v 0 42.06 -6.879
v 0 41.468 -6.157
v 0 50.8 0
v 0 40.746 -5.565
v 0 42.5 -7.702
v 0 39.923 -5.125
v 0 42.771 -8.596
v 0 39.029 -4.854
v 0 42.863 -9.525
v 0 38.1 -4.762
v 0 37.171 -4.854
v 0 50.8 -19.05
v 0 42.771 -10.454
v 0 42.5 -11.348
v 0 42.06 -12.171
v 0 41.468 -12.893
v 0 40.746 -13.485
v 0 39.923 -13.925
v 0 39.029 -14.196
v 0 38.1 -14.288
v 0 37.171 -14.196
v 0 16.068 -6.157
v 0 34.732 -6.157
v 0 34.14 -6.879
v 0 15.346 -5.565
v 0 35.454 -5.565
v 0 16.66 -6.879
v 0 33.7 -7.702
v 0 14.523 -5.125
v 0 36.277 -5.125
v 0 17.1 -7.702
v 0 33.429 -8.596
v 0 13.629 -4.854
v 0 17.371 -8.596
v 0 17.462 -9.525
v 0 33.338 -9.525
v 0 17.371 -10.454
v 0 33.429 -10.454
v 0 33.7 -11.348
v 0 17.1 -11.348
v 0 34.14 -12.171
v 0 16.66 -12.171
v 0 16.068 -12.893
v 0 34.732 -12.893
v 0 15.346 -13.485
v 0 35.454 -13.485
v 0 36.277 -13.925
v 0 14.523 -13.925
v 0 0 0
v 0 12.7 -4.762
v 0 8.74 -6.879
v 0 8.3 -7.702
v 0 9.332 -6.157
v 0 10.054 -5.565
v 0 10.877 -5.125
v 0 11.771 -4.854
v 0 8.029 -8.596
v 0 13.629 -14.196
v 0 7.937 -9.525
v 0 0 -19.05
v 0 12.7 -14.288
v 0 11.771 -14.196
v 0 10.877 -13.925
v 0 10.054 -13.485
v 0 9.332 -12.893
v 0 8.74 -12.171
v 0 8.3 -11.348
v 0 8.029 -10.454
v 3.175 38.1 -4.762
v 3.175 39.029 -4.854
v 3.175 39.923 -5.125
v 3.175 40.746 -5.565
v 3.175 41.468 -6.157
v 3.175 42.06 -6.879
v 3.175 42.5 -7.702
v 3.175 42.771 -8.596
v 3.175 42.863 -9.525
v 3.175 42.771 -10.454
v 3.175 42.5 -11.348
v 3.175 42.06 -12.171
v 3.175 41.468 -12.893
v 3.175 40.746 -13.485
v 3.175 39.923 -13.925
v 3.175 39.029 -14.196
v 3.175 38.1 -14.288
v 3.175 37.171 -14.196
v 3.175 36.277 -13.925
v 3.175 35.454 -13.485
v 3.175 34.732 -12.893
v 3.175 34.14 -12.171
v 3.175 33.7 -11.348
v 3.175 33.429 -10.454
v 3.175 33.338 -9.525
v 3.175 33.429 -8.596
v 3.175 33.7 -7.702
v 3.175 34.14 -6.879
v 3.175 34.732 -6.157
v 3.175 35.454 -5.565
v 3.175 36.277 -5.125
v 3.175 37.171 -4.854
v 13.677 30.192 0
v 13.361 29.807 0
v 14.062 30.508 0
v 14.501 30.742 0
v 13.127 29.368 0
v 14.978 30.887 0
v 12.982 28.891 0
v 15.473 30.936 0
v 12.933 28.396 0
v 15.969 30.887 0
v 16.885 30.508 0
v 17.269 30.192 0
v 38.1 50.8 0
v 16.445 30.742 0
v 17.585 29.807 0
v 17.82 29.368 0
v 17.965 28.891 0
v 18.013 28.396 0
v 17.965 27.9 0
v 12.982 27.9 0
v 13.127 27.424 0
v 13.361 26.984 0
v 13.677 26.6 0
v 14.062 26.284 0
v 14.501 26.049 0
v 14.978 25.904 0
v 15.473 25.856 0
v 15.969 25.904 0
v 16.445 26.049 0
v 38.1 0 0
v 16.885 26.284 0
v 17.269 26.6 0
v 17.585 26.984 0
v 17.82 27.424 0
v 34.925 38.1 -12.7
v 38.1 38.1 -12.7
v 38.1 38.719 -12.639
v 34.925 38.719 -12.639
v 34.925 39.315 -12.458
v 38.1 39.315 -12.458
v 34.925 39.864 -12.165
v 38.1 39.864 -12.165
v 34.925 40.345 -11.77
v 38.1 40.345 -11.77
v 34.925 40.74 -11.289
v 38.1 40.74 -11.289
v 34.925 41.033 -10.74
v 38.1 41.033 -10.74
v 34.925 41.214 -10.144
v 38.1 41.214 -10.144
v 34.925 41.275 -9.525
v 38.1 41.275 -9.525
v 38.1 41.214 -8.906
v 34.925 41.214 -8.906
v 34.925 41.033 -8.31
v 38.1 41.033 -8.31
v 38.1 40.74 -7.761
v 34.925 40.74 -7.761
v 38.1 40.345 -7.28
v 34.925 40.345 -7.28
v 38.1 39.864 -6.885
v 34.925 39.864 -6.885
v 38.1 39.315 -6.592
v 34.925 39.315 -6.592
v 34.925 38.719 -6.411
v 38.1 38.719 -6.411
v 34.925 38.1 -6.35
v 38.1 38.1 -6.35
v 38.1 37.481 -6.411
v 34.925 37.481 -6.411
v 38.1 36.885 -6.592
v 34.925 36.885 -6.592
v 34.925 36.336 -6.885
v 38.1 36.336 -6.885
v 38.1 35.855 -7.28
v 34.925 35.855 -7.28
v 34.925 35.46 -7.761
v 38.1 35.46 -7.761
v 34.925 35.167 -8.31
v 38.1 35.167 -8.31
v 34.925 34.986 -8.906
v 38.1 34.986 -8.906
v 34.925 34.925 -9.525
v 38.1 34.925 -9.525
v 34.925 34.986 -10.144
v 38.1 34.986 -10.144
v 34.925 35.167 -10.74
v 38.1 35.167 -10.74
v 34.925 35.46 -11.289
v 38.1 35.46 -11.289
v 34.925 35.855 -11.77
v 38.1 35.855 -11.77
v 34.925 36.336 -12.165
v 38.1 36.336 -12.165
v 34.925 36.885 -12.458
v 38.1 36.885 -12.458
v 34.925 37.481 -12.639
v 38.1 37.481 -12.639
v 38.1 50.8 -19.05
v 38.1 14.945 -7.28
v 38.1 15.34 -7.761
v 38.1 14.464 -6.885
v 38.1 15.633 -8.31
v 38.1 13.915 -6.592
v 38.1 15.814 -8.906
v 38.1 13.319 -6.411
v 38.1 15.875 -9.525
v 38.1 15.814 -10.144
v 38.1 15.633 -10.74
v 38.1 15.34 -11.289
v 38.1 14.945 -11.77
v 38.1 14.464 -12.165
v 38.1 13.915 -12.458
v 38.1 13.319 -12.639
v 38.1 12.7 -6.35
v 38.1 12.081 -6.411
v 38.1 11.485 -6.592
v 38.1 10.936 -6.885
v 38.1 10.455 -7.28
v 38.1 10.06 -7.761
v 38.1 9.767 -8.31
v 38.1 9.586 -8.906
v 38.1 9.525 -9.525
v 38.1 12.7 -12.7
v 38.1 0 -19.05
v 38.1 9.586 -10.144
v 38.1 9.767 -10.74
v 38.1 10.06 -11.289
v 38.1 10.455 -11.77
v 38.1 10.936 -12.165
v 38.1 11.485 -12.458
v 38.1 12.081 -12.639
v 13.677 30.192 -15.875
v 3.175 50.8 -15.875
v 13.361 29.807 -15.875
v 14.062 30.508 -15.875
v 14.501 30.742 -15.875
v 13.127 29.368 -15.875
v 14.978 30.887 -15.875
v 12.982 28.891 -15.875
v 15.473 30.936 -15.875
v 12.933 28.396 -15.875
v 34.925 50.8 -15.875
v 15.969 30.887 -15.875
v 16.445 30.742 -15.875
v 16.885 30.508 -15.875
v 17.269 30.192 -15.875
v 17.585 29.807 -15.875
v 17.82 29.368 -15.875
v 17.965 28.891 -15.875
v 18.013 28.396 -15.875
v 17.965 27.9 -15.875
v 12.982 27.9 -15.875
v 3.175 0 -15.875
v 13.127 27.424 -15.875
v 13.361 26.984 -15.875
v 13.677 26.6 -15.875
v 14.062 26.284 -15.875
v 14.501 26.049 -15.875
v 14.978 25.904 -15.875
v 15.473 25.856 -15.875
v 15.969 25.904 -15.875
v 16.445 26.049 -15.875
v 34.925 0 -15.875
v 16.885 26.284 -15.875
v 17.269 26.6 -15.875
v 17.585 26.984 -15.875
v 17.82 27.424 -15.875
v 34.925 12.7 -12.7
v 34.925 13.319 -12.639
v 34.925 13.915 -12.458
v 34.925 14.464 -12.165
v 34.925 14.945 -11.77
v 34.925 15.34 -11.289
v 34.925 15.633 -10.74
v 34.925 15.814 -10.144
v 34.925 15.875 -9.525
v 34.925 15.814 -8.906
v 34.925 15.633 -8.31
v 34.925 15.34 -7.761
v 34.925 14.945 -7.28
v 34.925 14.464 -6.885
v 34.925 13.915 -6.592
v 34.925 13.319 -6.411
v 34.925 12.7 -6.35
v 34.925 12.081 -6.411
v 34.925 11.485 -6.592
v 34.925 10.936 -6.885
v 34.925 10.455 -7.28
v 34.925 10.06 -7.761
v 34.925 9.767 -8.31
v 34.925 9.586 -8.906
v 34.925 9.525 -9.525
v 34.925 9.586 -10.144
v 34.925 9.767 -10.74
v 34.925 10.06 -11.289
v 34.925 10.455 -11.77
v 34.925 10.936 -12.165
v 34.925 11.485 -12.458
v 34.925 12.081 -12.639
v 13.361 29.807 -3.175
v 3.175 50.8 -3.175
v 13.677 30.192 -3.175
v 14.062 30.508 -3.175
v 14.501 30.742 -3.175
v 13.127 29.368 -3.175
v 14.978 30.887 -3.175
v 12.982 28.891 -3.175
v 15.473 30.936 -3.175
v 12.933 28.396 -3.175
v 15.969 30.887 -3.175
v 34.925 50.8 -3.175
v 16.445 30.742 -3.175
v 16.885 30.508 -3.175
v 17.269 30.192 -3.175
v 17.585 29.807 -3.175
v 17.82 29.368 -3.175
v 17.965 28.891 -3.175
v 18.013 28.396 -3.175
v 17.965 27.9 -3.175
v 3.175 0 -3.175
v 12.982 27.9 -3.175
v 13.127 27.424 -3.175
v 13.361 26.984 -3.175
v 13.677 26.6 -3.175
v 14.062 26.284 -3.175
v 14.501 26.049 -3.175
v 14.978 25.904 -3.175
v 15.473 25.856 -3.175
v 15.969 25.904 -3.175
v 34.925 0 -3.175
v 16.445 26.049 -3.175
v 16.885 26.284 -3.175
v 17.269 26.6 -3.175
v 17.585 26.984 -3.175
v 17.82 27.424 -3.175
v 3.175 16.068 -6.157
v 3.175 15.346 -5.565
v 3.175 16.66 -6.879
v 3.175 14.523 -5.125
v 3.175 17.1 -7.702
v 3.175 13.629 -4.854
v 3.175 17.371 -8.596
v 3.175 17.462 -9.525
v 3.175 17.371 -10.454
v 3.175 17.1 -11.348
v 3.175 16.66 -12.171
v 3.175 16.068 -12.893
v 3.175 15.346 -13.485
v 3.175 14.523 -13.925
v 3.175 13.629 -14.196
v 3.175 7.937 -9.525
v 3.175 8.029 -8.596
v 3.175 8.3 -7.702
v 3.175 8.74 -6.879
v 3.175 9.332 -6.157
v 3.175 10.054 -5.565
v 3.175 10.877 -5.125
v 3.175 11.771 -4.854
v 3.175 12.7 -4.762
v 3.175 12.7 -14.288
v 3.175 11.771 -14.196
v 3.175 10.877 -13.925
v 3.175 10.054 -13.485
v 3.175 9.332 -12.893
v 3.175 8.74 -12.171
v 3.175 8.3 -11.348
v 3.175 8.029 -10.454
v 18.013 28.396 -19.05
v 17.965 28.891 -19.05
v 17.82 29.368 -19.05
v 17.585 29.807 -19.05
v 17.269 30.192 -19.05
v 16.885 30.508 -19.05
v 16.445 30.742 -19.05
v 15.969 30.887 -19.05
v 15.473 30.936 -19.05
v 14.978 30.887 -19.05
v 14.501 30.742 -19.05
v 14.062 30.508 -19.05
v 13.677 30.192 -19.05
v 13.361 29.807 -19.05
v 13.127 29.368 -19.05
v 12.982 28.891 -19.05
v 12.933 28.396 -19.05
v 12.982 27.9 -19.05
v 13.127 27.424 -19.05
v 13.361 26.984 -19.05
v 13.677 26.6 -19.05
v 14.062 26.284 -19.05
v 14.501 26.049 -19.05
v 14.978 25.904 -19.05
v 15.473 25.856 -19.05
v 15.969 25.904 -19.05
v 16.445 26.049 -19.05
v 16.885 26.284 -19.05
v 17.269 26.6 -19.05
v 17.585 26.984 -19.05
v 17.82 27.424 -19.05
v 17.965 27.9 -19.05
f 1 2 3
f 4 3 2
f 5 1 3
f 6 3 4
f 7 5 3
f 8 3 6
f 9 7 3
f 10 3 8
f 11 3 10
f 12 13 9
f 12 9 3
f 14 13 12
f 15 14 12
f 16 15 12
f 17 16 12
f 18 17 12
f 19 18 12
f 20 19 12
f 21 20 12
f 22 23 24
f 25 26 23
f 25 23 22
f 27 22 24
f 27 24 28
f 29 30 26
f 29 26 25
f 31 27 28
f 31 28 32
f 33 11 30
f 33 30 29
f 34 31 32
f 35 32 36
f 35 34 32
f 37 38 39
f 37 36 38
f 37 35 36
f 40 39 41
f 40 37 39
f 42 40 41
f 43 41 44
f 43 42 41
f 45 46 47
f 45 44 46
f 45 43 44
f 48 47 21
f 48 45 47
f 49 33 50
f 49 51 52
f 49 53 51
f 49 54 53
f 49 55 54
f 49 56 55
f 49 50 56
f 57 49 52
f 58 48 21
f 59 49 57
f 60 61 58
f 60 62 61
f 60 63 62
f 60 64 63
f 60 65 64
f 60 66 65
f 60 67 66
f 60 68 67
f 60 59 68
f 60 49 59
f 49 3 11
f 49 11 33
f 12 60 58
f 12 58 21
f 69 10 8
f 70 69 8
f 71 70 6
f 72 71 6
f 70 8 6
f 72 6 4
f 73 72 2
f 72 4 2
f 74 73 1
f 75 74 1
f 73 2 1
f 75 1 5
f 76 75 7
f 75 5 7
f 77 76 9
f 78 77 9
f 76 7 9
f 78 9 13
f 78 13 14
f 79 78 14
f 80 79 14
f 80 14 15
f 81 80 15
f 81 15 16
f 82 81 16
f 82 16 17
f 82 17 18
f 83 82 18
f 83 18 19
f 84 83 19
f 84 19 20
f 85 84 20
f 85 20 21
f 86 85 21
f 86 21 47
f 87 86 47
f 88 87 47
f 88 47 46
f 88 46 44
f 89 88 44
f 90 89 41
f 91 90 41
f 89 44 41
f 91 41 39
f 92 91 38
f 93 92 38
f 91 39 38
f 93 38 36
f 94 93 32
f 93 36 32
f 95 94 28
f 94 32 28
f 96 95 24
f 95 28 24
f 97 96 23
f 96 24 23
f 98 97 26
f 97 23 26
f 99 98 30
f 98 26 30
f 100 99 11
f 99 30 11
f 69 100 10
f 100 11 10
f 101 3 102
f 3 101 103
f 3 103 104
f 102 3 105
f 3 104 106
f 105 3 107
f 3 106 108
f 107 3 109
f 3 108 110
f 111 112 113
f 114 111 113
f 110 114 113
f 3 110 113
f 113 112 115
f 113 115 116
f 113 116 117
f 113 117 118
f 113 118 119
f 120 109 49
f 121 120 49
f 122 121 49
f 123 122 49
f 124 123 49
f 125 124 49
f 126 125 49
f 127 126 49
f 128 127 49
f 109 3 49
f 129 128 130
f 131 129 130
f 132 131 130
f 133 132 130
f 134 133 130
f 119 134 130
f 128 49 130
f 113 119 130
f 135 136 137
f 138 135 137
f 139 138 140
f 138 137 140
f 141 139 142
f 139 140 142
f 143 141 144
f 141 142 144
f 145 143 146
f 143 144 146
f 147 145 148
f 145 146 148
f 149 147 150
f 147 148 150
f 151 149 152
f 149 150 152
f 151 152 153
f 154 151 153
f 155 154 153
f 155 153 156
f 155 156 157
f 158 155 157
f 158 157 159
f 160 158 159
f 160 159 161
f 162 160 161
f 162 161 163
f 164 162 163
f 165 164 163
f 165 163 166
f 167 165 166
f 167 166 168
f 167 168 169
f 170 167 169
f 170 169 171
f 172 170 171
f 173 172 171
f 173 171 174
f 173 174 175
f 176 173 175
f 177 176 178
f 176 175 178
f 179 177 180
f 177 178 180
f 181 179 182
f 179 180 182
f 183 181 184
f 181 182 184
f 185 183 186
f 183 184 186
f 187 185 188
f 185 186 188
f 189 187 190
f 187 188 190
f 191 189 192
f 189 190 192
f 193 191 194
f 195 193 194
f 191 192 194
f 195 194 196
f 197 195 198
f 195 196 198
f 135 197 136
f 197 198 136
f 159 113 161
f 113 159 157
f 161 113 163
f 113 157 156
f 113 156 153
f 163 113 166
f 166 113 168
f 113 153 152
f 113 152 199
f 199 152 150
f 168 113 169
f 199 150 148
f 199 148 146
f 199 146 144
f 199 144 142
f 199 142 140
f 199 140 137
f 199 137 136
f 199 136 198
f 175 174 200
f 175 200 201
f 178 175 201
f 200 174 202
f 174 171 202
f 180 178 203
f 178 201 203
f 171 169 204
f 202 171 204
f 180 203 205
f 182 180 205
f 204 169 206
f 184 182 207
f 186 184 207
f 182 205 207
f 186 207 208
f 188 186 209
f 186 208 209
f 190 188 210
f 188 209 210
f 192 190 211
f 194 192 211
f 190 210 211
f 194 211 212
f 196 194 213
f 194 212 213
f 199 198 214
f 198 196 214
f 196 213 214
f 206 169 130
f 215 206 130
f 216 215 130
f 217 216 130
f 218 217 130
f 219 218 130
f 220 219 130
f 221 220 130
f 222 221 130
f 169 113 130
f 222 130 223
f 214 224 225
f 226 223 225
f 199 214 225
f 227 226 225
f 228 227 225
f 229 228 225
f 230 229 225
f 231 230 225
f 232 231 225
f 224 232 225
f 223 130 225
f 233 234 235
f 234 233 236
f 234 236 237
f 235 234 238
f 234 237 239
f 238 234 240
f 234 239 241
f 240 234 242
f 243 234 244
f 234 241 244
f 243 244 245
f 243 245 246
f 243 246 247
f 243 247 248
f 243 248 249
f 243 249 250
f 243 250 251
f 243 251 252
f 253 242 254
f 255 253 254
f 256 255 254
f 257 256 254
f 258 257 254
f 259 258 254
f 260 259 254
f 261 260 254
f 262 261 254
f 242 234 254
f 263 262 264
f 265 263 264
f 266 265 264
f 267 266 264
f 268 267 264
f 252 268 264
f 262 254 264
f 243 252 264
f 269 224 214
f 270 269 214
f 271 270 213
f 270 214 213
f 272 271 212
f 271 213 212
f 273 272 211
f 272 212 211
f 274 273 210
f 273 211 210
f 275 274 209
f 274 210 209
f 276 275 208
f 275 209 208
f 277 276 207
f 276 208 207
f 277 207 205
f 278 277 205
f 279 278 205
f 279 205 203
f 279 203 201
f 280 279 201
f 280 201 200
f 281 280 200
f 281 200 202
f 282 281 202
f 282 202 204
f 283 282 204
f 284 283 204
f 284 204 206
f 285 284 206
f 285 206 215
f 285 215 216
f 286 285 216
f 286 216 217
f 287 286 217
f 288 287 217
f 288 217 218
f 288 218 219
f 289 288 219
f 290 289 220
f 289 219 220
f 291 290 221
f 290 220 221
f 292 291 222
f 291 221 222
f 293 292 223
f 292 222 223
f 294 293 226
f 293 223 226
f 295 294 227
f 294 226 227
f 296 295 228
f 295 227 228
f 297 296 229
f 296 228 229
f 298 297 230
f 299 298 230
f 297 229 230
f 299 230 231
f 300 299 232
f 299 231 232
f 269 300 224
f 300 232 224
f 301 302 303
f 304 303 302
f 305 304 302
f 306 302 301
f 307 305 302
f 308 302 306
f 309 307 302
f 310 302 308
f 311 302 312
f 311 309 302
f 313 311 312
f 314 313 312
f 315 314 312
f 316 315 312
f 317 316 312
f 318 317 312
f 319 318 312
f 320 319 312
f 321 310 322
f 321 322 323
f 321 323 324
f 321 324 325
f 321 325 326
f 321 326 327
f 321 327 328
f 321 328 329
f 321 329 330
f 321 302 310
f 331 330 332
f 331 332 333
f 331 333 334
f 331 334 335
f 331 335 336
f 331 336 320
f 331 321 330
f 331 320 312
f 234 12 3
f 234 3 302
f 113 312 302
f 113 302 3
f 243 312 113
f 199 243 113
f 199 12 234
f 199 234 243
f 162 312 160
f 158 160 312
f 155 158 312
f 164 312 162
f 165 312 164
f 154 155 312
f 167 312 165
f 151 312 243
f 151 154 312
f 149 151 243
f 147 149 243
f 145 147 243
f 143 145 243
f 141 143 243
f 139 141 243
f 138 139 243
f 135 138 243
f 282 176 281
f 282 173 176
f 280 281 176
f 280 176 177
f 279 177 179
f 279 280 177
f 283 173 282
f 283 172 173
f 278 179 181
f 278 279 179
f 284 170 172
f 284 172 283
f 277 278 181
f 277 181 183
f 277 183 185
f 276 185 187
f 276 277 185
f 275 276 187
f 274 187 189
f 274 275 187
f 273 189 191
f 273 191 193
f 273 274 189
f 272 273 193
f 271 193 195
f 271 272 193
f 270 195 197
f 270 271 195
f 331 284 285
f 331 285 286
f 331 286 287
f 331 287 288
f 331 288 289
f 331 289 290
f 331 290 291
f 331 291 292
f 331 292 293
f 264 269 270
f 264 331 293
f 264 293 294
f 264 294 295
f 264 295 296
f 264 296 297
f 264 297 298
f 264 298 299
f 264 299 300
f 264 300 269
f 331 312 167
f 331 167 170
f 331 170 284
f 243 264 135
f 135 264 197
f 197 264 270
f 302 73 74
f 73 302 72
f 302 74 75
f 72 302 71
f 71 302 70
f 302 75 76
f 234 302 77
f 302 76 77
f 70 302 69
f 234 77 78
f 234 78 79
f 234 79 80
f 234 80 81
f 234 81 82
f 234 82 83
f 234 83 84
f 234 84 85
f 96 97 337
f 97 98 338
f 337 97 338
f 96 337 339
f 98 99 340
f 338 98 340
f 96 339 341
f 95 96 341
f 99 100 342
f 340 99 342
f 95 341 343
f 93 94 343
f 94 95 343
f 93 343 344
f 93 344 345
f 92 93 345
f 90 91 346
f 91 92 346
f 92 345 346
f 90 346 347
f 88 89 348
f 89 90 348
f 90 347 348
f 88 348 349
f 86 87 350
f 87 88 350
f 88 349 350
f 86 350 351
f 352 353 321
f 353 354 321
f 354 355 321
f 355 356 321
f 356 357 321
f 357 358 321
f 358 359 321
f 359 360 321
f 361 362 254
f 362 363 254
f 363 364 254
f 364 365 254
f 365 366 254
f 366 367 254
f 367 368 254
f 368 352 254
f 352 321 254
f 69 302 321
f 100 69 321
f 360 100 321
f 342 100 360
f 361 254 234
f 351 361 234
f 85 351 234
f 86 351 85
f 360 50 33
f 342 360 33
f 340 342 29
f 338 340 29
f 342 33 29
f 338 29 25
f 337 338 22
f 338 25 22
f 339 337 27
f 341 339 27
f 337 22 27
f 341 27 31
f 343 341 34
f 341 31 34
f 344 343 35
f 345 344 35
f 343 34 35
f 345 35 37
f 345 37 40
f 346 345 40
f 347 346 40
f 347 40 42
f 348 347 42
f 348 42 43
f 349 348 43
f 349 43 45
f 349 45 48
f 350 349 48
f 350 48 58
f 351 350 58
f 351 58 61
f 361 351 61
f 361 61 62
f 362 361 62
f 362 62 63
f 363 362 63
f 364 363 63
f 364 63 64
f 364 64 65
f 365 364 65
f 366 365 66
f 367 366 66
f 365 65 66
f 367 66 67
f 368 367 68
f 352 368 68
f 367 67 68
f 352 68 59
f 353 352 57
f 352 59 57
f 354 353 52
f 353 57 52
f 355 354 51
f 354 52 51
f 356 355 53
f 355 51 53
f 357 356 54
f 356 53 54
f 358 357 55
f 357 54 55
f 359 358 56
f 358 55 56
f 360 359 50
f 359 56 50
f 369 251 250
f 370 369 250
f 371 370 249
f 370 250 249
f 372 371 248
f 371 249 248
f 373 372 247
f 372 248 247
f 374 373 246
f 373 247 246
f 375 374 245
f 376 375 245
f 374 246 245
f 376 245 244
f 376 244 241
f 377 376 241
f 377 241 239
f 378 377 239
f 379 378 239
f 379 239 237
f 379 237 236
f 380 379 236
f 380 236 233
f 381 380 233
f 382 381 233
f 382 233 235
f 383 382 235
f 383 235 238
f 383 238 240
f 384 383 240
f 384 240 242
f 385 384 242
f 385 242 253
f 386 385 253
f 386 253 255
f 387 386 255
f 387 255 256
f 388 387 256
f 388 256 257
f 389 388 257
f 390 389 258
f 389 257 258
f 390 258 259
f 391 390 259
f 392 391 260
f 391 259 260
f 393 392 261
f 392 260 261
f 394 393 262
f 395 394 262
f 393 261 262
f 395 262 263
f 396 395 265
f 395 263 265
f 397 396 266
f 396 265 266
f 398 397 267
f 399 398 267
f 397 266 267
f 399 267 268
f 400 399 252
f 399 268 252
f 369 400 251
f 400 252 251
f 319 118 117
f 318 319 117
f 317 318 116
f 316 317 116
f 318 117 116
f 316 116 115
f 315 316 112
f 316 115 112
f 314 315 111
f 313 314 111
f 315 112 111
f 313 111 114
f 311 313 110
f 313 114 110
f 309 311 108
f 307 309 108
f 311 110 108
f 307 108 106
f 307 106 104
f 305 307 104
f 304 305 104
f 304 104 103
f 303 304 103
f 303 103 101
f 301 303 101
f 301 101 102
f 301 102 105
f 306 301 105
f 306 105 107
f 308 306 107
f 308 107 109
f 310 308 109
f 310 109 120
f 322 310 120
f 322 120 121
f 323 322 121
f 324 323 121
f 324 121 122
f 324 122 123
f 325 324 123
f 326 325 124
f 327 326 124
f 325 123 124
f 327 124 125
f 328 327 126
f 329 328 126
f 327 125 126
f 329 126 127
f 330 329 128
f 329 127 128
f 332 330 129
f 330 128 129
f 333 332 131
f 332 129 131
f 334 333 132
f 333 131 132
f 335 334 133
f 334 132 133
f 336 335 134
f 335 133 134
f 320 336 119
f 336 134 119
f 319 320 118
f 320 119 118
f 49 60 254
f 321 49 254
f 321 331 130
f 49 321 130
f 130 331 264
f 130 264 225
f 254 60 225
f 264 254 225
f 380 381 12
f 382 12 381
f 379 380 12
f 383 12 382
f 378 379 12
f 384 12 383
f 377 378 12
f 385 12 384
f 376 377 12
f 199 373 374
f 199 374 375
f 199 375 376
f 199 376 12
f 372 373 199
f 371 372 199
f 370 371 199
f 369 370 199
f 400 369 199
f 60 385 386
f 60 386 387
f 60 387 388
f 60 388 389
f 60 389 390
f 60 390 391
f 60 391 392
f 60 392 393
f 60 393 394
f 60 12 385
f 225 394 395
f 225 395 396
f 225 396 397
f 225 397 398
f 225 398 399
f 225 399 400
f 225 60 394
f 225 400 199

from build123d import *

# Parameters (mm, degrees)
SKETCH1_W           = 38.1
SKETCH1_H           = 19.05
SKETCH1_W_2         = 31.75
SKETCH1_H_2         = 12.7
BOSS_EXTRUDE1_DEPTH = 50.8
SKETCH2_R           = 3.175
CUT_EXTRUDE1_DEPTH  = 39.1
SKETCH3_R           = 2.54
CUT_EXTRUDE2_DEPTH  = 20.05
CUT_EXTRUDE3_REACH  = 40.1
SKETCH4_R           = 4.7625


with BuildPart() as part:
    # Sketch1 → Boss-Extrude1 (new body)
    with BuildSketch(Plane(origin=(0, 0, 0), x_dir=(1, 0, 0), z_dir=(0, 1, 0))):
        with Locations((19.05, 9.525)):
            Rectangle(SKETCH1_W, SKETCH1_H)
        with Locations((19.05, 9.525)):
            Rectangle(SKETCH1_W_2, SKETCH1_H_2, mode=Mode.SUBTRACT)
    extrude(amount=BOSS_EXTRUDE1_DEPTH)

    # Sketch2 → Cut-Extrude1 (cut, through all)
    with BuildSketch(Plane(origin=(38.1, 0, 0), x_dir=(0, 0, -1), z_dir=(1, 0, 0))):
        with Locations((9.525, 38.1)):
            Circle(SKETCH2_R)
        with Locations((9.525, 12.7)):
            Circle(SKETCH2_R)
    extrude(amount=-CUT_EXTRUDE1_DEPTH, mode=Mode.SUBTRACT)

    # Sketch3 → Cut-Extrude2 (cut, through all)
    with BuildSketch(Plane.XY):
        with Locations((15.473378078, 28.395613607)):
            Circle(SKETCH3_R)
    extrude(amount=-CUT_EXTRUDE2_DEPTH, mode=Mode.SUBTRACT)

    # Sketch4 → Cut-Extrude3 (cut, up to next)
    with BuildSketch(Plane.ZY, mode=Mode.PRIVATE) as cut_extrude3_sk1:
        with Locations((-9.525, 12.7)):
            Circle(SKETCH4_R)
    cut_extrude3_tool1 = extrude(cut_extrude3_sk1.sketch, amount=-CUT_EXTRUDE3_REACH, mode=Mode.PRIVATE) & part.part
    add(cut_extrude3_tool1.solids().sort_by_distance((0, 12.7, -9.525))[0], mode=Mode.SUBTRACT)
    # Sketch4 → Cut-Extrude3 (cut, up to next)
    with BuildSketch(Plane.ZY, mode=Mode.PRIVATE) as cut_extrude3_sk2:
        with Locations((-9.525, 38.1)):
            Circle(SKETCH4_R)
    cut_extrude3_tool2 = extrude(cut_extrude3_sk2.sketch, amount=-CUT_EXTRUDE3_REACH, mode=Mode.PRIVATE) & part.part
    add(cut_extrude3_tool2.solids().sort_by_distance((0, 38.1, -9.525))[0], mode=Mode.SUBTRACT)


solid = part.part
